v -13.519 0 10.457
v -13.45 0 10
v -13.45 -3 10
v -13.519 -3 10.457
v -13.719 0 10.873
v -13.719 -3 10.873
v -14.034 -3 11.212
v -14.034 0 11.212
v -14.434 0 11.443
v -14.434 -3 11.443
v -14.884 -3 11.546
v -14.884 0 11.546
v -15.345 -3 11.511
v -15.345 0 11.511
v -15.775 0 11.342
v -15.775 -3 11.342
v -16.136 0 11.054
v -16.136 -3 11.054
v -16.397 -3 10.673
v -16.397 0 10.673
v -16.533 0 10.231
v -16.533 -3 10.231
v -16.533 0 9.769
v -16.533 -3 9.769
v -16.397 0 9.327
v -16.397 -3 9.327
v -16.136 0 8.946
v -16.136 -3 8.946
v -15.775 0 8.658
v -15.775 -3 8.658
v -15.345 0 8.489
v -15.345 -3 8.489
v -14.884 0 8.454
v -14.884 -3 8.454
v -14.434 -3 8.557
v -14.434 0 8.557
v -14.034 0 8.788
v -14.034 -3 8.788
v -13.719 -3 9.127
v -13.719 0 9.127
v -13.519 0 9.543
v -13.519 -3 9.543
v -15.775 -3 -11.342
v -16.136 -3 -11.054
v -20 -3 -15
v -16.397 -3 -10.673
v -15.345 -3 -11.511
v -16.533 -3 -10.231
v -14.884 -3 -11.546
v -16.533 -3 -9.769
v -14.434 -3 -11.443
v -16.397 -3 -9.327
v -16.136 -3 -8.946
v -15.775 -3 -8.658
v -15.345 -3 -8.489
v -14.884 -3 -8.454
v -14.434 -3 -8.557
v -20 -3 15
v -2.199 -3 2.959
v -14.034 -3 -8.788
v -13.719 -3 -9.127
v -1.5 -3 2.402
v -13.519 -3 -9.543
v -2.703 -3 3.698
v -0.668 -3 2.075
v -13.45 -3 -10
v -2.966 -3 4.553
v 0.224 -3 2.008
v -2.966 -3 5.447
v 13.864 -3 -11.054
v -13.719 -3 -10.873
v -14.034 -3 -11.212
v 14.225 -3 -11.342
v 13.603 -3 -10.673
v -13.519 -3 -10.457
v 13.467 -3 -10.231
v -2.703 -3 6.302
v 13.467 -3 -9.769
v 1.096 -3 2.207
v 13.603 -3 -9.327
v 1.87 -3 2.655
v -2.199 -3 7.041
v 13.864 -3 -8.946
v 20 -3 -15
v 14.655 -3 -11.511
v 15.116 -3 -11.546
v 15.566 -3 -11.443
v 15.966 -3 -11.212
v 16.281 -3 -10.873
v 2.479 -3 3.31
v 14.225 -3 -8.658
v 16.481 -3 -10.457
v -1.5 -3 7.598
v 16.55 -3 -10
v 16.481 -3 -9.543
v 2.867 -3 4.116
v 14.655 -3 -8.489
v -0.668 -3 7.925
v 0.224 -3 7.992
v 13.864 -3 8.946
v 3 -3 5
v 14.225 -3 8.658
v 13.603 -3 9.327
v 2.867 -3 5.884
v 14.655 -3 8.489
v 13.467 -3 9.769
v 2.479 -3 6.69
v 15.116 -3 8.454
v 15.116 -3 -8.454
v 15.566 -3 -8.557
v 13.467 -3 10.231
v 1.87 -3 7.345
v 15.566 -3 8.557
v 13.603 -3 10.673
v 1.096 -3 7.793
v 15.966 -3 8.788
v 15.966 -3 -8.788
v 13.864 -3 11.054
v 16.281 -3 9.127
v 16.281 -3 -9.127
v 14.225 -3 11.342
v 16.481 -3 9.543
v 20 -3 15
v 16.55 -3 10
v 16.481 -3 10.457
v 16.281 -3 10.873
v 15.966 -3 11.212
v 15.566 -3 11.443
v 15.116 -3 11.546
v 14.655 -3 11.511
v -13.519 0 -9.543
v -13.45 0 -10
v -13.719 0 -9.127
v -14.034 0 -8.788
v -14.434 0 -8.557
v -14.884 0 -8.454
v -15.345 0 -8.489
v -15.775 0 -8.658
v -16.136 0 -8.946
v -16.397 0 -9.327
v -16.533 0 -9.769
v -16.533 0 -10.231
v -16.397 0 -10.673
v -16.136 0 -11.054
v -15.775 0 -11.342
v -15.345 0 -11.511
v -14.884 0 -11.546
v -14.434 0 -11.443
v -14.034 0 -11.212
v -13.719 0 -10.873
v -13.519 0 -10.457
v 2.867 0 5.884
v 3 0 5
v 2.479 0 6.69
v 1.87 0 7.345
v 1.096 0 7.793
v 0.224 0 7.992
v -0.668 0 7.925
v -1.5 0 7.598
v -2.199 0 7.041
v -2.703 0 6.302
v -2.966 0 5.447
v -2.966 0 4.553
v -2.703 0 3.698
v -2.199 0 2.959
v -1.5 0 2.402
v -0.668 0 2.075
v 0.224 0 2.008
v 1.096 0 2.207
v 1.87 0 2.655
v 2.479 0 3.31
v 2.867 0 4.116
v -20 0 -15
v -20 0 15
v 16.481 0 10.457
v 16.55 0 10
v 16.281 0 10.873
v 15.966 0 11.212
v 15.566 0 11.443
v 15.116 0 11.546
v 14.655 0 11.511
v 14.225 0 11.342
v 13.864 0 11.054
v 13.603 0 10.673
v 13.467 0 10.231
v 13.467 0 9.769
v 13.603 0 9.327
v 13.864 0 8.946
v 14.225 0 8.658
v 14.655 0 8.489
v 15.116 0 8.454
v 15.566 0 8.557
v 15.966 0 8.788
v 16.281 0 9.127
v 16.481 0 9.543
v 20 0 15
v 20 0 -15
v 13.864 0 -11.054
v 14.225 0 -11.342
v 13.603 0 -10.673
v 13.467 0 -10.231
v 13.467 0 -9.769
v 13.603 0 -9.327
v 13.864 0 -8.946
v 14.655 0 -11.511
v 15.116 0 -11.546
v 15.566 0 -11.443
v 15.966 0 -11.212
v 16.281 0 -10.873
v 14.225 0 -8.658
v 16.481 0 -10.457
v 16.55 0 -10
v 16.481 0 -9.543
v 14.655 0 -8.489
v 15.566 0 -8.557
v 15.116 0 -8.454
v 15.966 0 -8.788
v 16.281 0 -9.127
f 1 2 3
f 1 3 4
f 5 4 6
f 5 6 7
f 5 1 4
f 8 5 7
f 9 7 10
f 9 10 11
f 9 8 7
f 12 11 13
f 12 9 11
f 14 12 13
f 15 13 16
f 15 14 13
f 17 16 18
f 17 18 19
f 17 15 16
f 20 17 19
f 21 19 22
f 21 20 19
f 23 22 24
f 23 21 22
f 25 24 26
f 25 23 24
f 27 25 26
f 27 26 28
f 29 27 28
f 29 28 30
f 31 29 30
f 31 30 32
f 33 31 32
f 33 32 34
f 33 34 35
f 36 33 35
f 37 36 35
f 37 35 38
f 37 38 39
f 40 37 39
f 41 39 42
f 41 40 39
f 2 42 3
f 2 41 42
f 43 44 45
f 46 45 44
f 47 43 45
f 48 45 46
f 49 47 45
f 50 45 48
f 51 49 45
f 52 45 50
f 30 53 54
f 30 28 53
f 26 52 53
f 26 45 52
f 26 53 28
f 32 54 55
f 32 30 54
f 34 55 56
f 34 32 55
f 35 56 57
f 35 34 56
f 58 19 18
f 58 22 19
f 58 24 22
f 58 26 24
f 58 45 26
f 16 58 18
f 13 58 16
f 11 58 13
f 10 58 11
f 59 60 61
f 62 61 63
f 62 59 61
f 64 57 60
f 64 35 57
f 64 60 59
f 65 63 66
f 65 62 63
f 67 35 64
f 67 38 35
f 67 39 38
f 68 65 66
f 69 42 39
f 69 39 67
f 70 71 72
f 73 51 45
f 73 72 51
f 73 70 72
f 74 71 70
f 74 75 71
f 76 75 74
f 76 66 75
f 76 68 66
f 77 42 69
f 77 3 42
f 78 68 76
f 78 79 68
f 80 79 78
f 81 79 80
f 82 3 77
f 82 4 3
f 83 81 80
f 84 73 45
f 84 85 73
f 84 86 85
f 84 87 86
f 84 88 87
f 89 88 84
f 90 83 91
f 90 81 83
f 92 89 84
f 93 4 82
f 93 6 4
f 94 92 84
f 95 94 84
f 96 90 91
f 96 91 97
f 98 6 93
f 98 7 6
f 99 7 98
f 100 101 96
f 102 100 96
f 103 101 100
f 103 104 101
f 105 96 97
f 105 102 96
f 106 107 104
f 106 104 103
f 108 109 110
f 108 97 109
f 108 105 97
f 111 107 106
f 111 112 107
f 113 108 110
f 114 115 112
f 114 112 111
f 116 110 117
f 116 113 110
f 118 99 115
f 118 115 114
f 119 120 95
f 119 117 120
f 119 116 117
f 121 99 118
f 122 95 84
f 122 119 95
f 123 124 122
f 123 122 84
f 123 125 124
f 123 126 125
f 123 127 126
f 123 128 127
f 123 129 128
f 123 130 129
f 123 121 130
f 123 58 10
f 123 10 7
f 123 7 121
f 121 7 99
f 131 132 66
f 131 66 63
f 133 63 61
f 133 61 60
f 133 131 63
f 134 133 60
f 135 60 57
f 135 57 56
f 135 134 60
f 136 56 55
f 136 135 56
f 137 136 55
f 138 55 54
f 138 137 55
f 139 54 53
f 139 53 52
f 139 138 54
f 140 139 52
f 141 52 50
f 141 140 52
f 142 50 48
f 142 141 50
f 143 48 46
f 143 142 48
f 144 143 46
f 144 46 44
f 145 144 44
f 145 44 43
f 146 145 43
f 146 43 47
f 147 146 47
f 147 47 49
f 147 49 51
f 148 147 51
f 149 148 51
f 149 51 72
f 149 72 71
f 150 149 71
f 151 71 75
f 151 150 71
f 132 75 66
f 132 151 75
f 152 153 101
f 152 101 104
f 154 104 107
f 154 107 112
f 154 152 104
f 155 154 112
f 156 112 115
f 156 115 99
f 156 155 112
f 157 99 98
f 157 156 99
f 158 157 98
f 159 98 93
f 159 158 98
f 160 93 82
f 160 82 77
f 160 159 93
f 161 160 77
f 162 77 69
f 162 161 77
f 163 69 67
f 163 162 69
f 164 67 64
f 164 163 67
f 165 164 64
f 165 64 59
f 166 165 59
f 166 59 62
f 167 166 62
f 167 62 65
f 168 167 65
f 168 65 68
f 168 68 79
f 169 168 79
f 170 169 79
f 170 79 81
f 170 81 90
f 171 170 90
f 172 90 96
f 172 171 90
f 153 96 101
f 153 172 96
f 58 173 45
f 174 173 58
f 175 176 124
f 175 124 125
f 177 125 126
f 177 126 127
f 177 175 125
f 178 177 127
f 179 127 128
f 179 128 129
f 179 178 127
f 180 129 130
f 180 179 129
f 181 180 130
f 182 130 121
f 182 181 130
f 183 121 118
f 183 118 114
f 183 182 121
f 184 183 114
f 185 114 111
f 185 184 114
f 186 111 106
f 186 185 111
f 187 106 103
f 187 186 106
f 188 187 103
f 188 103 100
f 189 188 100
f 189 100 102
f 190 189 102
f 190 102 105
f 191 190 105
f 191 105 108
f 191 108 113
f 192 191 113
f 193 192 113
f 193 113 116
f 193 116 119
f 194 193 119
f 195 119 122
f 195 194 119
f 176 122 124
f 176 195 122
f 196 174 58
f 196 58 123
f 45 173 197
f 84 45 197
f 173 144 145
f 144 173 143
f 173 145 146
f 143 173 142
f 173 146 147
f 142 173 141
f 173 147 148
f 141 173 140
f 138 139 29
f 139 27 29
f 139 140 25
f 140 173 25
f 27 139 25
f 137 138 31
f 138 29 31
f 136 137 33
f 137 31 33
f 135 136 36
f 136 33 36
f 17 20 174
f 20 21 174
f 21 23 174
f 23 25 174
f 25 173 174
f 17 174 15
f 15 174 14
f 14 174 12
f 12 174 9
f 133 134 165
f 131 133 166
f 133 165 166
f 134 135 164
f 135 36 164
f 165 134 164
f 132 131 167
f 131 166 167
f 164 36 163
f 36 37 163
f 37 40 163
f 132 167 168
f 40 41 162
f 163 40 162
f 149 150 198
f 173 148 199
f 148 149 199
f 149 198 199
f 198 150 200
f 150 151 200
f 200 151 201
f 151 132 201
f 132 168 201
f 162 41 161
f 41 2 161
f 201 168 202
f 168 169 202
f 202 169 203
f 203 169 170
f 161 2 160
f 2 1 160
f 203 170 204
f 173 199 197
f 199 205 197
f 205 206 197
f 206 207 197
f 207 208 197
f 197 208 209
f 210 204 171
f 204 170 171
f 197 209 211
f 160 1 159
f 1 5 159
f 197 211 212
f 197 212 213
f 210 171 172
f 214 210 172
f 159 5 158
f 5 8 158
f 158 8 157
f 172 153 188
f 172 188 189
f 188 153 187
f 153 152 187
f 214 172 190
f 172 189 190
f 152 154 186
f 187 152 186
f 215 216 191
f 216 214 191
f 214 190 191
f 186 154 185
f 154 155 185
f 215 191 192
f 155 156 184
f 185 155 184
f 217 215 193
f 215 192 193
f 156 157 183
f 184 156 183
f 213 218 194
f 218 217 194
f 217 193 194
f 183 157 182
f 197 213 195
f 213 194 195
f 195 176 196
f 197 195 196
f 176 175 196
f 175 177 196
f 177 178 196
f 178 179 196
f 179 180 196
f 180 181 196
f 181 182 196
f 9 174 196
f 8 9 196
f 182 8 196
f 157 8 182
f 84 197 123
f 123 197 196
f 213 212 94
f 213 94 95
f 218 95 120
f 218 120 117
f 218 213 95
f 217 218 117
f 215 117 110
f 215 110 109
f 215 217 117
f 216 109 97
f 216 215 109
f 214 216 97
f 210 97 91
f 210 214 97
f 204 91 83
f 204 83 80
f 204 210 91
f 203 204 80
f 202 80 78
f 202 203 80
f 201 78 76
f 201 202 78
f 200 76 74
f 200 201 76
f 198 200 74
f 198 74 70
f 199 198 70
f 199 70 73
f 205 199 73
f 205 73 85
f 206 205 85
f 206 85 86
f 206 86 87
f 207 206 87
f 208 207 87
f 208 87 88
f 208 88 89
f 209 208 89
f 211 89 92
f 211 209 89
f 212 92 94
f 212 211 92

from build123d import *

# Parameters (mm, degrees)
F0_W     = 40
F0_H     = 30
F0_R     = 1.55
F0_R_2   = 3
F1_DEPTH = 3


with BuildPart() as f1:
    # F0 (on Front) → F1 (new body)
    with BuildSketch(Plane.XZ):
        Rectangle(F0_W, F0_H)
        with Locations((-15, -10)):
            Circle(F0_R, mode=Mode.SUBTRACT)
        with Locations((15, -10)):
            Circle(F0_R, mode=Mode.SUBTRACT)
        with Locations((-15, 10)):
            Circle(F0_R, mode=Mode.SUBTRACT)
        with Locations((0, 5)):
            Circle(F0_R_2, mode=Mode.SUBTRACT)
        with Locations((15, 10)):
            Circle(F0_R, mode=Mode.SUBTRACT)
    extrude(amount=F1_DEPTH)


solid = f1.part
